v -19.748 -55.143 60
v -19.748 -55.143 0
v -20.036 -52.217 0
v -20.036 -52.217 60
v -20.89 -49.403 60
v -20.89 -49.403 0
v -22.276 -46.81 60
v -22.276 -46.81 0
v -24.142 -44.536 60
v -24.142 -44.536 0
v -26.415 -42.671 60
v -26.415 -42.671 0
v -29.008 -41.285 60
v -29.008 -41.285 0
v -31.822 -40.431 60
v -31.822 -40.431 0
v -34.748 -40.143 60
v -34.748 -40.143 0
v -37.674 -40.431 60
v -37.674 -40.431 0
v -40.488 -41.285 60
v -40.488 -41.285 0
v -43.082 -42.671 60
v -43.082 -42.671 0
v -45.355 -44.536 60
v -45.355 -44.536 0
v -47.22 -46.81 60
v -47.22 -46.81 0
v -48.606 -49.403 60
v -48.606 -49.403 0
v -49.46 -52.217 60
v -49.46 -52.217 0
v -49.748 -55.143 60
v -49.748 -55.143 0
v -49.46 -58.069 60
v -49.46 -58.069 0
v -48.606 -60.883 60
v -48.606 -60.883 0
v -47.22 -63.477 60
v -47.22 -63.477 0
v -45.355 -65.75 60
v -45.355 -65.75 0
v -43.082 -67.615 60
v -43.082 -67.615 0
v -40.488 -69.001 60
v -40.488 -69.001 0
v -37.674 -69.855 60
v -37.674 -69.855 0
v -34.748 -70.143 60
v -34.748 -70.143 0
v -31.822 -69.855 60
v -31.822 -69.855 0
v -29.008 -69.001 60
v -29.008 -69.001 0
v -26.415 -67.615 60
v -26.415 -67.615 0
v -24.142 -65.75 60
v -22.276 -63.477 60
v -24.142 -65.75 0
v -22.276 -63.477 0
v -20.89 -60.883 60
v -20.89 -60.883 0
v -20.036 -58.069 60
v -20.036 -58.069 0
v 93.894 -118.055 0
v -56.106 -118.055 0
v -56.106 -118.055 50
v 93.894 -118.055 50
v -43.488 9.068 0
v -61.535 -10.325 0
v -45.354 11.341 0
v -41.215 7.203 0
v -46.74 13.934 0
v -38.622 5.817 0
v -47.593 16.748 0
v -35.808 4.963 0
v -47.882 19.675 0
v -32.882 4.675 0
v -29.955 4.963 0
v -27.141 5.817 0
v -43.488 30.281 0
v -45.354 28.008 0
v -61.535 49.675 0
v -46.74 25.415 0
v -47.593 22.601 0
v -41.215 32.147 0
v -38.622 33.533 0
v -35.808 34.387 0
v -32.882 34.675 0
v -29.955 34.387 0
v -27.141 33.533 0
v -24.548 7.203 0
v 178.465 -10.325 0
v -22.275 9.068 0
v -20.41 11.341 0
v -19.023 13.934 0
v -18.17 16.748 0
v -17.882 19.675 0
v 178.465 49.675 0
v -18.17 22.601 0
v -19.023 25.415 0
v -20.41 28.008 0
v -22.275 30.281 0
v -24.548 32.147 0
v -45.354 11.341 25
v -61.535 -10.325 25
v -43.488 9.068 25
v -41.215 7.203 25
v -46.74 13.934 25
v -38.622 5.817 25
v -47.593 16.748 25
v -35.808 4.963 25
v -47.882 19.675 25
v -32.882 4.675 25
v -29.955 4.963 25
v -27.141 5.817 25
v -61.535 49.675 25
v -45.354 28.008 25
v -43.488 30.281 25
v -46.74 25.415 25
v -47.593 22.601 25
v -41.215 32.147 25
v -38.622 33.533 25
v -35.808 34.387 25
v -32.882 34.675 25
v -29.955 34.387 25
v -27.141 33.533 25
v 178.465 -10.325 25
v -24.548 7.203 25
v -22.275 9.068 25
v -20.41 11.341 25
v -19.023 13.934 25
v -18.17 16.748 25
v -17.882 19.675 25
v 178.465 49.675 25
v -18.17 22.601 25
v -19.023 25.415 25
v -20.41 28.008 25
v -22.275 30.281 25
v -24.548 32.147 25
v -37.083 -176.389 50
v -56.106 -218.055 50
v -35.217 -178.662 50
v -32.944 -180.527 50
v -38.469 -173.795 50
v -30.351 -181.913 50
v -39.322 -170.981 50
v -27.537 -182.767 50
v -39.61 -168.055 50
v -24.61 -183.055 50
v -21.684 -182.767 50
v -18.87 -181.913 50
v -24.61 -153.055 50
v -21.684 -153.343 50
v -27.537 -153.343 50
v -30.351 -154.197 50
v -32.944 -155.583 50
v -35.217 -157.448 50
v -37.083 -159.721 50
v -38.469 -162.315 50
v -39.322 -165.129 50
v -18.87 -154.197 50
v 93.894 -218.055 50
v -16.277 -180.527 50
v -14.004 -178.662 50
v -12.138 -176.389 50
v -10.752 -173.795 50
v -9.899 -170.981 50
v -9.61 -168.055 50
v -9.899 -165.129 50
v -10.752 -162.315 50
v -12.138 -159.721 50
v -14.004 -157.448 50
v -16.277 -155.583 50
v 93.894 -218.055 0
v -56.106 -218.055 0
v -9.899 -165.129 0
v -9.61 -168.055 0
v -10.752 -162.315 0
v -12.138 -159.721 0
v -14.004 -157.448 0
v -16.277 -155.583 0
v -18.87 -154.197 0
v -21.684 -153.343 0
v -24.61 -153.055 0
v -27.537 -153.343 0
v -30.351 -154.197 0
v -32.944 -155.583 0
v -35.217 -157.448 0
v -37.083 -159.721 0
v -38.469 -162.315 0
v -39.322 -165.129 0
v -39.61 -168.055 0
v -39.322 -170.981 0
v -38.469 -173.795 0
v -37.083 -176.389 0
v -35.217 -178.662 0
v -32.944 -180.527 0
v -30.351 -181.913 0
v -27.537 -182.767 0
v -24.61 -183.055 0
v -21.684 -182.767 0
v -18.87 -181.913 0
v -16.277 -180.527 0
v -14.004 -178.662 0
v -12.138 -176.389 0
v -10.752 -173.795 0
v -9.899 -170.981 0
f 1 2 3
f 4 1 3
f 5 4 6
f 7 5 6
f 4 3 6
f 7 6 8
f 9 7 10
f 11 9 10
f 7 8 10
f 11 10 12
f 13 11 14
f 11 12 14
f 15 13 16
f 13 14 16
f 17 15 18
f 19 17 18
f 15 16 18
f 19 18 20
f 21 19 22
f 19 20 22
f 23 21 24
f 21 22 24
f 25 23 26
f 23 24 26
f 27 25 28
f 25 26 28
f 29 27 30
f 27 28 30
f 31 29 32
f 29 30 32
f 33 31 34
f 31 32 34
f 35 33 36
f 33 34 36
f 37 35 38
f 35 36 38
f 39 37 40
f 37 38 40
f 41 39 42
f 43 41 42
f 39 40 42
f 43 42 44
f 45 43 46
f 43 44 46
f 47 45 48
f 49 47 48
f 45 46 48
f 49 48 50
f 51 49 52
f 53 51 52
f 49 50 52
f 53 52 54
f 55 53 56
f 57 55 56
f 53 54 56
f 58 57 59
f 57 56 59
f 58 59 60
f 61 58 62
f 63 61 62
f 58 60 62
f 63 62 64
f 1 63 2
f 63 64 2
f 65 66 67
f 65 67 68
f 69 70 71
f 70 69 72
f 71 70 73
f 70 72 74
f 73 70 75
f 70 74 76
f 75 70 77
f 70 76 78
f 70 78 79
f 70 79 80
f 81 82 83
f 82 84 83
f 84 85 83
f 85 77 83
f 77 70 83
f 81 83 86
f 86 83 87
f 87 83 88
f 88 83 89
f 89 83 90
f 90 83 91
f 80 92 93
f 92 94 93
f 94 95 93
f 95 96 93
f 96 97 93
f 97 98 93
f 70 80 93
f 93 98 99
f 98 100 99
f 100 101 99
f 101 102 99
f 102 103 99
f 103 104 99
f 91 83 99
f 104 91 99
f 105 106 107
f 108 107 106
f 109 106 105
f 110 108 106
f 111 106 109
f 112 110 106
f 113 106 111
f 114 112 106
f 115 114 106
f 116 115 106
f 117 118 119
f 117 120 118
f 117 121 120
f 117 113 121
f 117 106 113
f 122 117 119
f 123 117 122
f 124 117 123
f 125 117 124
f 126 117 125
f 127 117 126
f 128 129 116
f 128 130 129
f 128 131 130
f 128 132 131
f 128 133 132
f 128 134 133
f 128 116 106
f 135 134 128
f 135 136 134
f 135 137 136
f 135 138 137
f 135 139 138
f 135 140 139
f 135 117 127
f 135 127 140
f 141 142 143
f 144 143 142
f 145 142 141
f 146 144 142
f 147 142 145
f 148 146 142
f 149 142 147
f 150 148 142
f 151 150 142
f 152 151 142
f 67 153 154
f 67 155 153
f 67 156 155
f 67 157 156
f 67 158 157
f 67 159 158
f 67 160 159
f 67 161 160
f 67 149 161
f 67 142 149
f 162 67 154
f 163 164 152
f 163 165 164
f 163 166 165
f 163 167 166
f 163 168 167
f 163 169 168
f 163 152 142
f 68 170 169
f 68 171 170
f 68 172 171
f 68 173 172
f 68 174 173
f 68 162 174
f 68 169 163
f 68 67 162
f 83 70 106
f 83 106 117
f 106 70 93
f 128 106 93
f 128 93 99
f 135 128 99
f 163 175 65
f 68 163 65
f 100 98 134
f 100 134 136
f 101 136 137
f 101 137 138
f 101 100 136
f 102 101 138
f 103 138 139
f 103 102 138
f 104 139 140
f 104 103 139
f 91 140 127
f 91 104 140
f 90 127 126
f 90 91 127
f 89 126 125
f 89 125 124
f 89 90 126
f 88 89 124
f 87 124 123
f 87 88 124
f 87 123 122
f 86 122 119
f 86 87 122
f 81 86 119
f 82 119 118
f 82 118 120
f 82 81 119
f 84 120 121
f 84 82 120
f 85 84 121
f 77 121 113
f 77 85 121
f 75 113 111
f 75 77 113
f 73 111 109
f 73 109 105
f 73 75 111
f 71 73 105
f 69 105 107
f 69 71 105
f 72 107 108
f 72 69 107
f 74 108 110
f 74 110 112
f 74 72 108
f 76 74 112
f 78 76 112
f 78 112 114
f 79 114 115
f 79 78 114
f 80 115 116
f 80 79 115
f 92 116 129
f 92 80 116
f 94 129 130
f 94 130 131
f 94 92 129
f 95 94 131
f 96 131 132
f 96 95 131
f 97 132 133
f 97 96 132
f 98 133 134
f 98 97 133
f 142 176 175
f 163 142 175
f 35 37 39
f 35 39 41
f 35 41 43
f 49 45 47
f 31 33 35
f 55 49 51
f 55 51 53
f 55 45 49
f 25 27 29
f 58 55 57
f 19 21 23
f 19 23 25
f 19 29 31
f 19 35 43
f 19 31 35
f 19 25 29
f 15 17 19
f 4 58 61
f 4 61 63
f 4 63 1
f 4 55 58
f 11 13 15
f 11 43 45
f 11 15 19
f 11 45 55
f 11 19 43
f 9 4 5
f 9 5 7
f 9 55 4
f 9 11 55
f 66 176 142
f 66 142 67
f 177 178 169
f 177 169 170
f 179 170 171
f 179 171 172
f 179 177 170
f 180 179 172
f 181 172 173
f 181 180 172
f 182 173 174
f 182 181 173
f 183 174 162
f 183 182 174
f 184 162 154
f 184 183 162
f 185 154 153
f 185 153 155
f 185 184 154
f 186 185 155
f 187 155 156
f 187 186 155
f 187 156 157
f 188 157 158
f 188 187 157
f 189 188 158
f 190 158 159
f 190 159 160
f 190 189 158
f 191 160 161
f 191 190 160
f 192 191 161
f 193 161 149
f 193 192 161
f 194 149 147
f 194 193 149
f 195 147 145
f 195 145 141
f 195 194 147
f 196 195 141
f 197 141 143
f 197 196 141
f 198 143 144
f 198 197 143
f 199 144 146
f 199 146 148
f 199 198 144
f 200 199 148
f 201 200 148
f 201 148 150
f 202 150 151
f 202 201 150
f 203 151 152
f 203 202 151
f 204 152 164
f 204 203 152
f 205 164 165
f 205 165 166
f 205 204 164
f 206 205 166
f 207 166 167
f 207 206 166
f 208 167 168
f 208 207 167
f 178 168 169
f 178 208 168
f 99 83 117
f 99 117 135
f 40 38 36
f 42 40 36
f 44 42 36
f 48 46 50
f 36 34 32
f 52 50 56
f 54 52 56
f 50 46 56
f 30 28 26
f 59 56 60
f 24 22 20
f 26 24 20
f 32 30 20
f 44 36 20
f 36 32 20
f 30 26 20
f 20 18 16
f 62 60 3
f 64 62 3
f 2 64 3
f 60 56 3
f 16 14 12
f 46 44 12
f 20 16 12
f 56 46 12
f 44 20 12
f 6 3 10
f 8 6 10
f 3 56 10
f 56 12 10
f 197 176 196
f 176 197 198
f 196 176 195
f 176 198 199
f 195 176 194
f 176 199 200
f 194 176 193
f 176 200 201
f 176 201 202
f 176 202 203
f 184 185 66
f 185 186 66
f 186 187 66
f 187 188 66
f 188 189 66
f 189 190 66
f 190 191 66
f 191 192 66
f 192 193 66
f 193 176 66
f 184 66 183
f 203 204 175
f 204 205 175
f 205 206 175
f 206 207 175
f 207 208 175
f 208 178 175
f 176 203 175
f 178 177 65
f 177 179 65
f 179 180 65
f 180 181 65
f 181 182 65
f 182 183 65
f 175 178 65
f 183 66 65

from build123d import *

# Parameters (mm, degrees)
F0_W     = 240
F0_H     = 60
F0_R     = 15
F1_DEPTH = 25
F2_R     = 15
F3_DEPTH = 60
F4_W     = 150
F4_H     = 100
F4_R     = 15
F5_DEPTH = 50


with BuildPart() as f1:
    # F0 (on Top) → F1 (new body)
    with BuildSketch(Plane.XY):
        with Locations((58.465285, 19.674728)):
            Rectangle(F0_W, F0_H)
        with Locations((-32.881599, 19.674728)):
            Circle(F0_R, mode=Mode.SUBTRACT)
    extrude(amount=F1_DEPTH)


with BuildPart() as f3:
    # F2 (on Top) → F3 (new body)
    with BuildSketch(Plane.XY):
        with Locations((-34.748107, -55.143096)):
            Circle(F2_R)
    extrude(amount=F3_DEPTH)


with BuildPart() as f5:
    # F4 (on Top) → F5 (new body)
    with BuildSketch(Plane.XY):
        with Locations((18.893618, -168.055004)):
            Rectangle(F4_W, F4_H)
        with Locations((-24.61046, -168.055004)):
            Circle(F4_R, mode=Mode.SUBTRACT)
    extrude(amount=F5_DEPTH)


solid = Compound([f1.part, f3.part, f5.part])
